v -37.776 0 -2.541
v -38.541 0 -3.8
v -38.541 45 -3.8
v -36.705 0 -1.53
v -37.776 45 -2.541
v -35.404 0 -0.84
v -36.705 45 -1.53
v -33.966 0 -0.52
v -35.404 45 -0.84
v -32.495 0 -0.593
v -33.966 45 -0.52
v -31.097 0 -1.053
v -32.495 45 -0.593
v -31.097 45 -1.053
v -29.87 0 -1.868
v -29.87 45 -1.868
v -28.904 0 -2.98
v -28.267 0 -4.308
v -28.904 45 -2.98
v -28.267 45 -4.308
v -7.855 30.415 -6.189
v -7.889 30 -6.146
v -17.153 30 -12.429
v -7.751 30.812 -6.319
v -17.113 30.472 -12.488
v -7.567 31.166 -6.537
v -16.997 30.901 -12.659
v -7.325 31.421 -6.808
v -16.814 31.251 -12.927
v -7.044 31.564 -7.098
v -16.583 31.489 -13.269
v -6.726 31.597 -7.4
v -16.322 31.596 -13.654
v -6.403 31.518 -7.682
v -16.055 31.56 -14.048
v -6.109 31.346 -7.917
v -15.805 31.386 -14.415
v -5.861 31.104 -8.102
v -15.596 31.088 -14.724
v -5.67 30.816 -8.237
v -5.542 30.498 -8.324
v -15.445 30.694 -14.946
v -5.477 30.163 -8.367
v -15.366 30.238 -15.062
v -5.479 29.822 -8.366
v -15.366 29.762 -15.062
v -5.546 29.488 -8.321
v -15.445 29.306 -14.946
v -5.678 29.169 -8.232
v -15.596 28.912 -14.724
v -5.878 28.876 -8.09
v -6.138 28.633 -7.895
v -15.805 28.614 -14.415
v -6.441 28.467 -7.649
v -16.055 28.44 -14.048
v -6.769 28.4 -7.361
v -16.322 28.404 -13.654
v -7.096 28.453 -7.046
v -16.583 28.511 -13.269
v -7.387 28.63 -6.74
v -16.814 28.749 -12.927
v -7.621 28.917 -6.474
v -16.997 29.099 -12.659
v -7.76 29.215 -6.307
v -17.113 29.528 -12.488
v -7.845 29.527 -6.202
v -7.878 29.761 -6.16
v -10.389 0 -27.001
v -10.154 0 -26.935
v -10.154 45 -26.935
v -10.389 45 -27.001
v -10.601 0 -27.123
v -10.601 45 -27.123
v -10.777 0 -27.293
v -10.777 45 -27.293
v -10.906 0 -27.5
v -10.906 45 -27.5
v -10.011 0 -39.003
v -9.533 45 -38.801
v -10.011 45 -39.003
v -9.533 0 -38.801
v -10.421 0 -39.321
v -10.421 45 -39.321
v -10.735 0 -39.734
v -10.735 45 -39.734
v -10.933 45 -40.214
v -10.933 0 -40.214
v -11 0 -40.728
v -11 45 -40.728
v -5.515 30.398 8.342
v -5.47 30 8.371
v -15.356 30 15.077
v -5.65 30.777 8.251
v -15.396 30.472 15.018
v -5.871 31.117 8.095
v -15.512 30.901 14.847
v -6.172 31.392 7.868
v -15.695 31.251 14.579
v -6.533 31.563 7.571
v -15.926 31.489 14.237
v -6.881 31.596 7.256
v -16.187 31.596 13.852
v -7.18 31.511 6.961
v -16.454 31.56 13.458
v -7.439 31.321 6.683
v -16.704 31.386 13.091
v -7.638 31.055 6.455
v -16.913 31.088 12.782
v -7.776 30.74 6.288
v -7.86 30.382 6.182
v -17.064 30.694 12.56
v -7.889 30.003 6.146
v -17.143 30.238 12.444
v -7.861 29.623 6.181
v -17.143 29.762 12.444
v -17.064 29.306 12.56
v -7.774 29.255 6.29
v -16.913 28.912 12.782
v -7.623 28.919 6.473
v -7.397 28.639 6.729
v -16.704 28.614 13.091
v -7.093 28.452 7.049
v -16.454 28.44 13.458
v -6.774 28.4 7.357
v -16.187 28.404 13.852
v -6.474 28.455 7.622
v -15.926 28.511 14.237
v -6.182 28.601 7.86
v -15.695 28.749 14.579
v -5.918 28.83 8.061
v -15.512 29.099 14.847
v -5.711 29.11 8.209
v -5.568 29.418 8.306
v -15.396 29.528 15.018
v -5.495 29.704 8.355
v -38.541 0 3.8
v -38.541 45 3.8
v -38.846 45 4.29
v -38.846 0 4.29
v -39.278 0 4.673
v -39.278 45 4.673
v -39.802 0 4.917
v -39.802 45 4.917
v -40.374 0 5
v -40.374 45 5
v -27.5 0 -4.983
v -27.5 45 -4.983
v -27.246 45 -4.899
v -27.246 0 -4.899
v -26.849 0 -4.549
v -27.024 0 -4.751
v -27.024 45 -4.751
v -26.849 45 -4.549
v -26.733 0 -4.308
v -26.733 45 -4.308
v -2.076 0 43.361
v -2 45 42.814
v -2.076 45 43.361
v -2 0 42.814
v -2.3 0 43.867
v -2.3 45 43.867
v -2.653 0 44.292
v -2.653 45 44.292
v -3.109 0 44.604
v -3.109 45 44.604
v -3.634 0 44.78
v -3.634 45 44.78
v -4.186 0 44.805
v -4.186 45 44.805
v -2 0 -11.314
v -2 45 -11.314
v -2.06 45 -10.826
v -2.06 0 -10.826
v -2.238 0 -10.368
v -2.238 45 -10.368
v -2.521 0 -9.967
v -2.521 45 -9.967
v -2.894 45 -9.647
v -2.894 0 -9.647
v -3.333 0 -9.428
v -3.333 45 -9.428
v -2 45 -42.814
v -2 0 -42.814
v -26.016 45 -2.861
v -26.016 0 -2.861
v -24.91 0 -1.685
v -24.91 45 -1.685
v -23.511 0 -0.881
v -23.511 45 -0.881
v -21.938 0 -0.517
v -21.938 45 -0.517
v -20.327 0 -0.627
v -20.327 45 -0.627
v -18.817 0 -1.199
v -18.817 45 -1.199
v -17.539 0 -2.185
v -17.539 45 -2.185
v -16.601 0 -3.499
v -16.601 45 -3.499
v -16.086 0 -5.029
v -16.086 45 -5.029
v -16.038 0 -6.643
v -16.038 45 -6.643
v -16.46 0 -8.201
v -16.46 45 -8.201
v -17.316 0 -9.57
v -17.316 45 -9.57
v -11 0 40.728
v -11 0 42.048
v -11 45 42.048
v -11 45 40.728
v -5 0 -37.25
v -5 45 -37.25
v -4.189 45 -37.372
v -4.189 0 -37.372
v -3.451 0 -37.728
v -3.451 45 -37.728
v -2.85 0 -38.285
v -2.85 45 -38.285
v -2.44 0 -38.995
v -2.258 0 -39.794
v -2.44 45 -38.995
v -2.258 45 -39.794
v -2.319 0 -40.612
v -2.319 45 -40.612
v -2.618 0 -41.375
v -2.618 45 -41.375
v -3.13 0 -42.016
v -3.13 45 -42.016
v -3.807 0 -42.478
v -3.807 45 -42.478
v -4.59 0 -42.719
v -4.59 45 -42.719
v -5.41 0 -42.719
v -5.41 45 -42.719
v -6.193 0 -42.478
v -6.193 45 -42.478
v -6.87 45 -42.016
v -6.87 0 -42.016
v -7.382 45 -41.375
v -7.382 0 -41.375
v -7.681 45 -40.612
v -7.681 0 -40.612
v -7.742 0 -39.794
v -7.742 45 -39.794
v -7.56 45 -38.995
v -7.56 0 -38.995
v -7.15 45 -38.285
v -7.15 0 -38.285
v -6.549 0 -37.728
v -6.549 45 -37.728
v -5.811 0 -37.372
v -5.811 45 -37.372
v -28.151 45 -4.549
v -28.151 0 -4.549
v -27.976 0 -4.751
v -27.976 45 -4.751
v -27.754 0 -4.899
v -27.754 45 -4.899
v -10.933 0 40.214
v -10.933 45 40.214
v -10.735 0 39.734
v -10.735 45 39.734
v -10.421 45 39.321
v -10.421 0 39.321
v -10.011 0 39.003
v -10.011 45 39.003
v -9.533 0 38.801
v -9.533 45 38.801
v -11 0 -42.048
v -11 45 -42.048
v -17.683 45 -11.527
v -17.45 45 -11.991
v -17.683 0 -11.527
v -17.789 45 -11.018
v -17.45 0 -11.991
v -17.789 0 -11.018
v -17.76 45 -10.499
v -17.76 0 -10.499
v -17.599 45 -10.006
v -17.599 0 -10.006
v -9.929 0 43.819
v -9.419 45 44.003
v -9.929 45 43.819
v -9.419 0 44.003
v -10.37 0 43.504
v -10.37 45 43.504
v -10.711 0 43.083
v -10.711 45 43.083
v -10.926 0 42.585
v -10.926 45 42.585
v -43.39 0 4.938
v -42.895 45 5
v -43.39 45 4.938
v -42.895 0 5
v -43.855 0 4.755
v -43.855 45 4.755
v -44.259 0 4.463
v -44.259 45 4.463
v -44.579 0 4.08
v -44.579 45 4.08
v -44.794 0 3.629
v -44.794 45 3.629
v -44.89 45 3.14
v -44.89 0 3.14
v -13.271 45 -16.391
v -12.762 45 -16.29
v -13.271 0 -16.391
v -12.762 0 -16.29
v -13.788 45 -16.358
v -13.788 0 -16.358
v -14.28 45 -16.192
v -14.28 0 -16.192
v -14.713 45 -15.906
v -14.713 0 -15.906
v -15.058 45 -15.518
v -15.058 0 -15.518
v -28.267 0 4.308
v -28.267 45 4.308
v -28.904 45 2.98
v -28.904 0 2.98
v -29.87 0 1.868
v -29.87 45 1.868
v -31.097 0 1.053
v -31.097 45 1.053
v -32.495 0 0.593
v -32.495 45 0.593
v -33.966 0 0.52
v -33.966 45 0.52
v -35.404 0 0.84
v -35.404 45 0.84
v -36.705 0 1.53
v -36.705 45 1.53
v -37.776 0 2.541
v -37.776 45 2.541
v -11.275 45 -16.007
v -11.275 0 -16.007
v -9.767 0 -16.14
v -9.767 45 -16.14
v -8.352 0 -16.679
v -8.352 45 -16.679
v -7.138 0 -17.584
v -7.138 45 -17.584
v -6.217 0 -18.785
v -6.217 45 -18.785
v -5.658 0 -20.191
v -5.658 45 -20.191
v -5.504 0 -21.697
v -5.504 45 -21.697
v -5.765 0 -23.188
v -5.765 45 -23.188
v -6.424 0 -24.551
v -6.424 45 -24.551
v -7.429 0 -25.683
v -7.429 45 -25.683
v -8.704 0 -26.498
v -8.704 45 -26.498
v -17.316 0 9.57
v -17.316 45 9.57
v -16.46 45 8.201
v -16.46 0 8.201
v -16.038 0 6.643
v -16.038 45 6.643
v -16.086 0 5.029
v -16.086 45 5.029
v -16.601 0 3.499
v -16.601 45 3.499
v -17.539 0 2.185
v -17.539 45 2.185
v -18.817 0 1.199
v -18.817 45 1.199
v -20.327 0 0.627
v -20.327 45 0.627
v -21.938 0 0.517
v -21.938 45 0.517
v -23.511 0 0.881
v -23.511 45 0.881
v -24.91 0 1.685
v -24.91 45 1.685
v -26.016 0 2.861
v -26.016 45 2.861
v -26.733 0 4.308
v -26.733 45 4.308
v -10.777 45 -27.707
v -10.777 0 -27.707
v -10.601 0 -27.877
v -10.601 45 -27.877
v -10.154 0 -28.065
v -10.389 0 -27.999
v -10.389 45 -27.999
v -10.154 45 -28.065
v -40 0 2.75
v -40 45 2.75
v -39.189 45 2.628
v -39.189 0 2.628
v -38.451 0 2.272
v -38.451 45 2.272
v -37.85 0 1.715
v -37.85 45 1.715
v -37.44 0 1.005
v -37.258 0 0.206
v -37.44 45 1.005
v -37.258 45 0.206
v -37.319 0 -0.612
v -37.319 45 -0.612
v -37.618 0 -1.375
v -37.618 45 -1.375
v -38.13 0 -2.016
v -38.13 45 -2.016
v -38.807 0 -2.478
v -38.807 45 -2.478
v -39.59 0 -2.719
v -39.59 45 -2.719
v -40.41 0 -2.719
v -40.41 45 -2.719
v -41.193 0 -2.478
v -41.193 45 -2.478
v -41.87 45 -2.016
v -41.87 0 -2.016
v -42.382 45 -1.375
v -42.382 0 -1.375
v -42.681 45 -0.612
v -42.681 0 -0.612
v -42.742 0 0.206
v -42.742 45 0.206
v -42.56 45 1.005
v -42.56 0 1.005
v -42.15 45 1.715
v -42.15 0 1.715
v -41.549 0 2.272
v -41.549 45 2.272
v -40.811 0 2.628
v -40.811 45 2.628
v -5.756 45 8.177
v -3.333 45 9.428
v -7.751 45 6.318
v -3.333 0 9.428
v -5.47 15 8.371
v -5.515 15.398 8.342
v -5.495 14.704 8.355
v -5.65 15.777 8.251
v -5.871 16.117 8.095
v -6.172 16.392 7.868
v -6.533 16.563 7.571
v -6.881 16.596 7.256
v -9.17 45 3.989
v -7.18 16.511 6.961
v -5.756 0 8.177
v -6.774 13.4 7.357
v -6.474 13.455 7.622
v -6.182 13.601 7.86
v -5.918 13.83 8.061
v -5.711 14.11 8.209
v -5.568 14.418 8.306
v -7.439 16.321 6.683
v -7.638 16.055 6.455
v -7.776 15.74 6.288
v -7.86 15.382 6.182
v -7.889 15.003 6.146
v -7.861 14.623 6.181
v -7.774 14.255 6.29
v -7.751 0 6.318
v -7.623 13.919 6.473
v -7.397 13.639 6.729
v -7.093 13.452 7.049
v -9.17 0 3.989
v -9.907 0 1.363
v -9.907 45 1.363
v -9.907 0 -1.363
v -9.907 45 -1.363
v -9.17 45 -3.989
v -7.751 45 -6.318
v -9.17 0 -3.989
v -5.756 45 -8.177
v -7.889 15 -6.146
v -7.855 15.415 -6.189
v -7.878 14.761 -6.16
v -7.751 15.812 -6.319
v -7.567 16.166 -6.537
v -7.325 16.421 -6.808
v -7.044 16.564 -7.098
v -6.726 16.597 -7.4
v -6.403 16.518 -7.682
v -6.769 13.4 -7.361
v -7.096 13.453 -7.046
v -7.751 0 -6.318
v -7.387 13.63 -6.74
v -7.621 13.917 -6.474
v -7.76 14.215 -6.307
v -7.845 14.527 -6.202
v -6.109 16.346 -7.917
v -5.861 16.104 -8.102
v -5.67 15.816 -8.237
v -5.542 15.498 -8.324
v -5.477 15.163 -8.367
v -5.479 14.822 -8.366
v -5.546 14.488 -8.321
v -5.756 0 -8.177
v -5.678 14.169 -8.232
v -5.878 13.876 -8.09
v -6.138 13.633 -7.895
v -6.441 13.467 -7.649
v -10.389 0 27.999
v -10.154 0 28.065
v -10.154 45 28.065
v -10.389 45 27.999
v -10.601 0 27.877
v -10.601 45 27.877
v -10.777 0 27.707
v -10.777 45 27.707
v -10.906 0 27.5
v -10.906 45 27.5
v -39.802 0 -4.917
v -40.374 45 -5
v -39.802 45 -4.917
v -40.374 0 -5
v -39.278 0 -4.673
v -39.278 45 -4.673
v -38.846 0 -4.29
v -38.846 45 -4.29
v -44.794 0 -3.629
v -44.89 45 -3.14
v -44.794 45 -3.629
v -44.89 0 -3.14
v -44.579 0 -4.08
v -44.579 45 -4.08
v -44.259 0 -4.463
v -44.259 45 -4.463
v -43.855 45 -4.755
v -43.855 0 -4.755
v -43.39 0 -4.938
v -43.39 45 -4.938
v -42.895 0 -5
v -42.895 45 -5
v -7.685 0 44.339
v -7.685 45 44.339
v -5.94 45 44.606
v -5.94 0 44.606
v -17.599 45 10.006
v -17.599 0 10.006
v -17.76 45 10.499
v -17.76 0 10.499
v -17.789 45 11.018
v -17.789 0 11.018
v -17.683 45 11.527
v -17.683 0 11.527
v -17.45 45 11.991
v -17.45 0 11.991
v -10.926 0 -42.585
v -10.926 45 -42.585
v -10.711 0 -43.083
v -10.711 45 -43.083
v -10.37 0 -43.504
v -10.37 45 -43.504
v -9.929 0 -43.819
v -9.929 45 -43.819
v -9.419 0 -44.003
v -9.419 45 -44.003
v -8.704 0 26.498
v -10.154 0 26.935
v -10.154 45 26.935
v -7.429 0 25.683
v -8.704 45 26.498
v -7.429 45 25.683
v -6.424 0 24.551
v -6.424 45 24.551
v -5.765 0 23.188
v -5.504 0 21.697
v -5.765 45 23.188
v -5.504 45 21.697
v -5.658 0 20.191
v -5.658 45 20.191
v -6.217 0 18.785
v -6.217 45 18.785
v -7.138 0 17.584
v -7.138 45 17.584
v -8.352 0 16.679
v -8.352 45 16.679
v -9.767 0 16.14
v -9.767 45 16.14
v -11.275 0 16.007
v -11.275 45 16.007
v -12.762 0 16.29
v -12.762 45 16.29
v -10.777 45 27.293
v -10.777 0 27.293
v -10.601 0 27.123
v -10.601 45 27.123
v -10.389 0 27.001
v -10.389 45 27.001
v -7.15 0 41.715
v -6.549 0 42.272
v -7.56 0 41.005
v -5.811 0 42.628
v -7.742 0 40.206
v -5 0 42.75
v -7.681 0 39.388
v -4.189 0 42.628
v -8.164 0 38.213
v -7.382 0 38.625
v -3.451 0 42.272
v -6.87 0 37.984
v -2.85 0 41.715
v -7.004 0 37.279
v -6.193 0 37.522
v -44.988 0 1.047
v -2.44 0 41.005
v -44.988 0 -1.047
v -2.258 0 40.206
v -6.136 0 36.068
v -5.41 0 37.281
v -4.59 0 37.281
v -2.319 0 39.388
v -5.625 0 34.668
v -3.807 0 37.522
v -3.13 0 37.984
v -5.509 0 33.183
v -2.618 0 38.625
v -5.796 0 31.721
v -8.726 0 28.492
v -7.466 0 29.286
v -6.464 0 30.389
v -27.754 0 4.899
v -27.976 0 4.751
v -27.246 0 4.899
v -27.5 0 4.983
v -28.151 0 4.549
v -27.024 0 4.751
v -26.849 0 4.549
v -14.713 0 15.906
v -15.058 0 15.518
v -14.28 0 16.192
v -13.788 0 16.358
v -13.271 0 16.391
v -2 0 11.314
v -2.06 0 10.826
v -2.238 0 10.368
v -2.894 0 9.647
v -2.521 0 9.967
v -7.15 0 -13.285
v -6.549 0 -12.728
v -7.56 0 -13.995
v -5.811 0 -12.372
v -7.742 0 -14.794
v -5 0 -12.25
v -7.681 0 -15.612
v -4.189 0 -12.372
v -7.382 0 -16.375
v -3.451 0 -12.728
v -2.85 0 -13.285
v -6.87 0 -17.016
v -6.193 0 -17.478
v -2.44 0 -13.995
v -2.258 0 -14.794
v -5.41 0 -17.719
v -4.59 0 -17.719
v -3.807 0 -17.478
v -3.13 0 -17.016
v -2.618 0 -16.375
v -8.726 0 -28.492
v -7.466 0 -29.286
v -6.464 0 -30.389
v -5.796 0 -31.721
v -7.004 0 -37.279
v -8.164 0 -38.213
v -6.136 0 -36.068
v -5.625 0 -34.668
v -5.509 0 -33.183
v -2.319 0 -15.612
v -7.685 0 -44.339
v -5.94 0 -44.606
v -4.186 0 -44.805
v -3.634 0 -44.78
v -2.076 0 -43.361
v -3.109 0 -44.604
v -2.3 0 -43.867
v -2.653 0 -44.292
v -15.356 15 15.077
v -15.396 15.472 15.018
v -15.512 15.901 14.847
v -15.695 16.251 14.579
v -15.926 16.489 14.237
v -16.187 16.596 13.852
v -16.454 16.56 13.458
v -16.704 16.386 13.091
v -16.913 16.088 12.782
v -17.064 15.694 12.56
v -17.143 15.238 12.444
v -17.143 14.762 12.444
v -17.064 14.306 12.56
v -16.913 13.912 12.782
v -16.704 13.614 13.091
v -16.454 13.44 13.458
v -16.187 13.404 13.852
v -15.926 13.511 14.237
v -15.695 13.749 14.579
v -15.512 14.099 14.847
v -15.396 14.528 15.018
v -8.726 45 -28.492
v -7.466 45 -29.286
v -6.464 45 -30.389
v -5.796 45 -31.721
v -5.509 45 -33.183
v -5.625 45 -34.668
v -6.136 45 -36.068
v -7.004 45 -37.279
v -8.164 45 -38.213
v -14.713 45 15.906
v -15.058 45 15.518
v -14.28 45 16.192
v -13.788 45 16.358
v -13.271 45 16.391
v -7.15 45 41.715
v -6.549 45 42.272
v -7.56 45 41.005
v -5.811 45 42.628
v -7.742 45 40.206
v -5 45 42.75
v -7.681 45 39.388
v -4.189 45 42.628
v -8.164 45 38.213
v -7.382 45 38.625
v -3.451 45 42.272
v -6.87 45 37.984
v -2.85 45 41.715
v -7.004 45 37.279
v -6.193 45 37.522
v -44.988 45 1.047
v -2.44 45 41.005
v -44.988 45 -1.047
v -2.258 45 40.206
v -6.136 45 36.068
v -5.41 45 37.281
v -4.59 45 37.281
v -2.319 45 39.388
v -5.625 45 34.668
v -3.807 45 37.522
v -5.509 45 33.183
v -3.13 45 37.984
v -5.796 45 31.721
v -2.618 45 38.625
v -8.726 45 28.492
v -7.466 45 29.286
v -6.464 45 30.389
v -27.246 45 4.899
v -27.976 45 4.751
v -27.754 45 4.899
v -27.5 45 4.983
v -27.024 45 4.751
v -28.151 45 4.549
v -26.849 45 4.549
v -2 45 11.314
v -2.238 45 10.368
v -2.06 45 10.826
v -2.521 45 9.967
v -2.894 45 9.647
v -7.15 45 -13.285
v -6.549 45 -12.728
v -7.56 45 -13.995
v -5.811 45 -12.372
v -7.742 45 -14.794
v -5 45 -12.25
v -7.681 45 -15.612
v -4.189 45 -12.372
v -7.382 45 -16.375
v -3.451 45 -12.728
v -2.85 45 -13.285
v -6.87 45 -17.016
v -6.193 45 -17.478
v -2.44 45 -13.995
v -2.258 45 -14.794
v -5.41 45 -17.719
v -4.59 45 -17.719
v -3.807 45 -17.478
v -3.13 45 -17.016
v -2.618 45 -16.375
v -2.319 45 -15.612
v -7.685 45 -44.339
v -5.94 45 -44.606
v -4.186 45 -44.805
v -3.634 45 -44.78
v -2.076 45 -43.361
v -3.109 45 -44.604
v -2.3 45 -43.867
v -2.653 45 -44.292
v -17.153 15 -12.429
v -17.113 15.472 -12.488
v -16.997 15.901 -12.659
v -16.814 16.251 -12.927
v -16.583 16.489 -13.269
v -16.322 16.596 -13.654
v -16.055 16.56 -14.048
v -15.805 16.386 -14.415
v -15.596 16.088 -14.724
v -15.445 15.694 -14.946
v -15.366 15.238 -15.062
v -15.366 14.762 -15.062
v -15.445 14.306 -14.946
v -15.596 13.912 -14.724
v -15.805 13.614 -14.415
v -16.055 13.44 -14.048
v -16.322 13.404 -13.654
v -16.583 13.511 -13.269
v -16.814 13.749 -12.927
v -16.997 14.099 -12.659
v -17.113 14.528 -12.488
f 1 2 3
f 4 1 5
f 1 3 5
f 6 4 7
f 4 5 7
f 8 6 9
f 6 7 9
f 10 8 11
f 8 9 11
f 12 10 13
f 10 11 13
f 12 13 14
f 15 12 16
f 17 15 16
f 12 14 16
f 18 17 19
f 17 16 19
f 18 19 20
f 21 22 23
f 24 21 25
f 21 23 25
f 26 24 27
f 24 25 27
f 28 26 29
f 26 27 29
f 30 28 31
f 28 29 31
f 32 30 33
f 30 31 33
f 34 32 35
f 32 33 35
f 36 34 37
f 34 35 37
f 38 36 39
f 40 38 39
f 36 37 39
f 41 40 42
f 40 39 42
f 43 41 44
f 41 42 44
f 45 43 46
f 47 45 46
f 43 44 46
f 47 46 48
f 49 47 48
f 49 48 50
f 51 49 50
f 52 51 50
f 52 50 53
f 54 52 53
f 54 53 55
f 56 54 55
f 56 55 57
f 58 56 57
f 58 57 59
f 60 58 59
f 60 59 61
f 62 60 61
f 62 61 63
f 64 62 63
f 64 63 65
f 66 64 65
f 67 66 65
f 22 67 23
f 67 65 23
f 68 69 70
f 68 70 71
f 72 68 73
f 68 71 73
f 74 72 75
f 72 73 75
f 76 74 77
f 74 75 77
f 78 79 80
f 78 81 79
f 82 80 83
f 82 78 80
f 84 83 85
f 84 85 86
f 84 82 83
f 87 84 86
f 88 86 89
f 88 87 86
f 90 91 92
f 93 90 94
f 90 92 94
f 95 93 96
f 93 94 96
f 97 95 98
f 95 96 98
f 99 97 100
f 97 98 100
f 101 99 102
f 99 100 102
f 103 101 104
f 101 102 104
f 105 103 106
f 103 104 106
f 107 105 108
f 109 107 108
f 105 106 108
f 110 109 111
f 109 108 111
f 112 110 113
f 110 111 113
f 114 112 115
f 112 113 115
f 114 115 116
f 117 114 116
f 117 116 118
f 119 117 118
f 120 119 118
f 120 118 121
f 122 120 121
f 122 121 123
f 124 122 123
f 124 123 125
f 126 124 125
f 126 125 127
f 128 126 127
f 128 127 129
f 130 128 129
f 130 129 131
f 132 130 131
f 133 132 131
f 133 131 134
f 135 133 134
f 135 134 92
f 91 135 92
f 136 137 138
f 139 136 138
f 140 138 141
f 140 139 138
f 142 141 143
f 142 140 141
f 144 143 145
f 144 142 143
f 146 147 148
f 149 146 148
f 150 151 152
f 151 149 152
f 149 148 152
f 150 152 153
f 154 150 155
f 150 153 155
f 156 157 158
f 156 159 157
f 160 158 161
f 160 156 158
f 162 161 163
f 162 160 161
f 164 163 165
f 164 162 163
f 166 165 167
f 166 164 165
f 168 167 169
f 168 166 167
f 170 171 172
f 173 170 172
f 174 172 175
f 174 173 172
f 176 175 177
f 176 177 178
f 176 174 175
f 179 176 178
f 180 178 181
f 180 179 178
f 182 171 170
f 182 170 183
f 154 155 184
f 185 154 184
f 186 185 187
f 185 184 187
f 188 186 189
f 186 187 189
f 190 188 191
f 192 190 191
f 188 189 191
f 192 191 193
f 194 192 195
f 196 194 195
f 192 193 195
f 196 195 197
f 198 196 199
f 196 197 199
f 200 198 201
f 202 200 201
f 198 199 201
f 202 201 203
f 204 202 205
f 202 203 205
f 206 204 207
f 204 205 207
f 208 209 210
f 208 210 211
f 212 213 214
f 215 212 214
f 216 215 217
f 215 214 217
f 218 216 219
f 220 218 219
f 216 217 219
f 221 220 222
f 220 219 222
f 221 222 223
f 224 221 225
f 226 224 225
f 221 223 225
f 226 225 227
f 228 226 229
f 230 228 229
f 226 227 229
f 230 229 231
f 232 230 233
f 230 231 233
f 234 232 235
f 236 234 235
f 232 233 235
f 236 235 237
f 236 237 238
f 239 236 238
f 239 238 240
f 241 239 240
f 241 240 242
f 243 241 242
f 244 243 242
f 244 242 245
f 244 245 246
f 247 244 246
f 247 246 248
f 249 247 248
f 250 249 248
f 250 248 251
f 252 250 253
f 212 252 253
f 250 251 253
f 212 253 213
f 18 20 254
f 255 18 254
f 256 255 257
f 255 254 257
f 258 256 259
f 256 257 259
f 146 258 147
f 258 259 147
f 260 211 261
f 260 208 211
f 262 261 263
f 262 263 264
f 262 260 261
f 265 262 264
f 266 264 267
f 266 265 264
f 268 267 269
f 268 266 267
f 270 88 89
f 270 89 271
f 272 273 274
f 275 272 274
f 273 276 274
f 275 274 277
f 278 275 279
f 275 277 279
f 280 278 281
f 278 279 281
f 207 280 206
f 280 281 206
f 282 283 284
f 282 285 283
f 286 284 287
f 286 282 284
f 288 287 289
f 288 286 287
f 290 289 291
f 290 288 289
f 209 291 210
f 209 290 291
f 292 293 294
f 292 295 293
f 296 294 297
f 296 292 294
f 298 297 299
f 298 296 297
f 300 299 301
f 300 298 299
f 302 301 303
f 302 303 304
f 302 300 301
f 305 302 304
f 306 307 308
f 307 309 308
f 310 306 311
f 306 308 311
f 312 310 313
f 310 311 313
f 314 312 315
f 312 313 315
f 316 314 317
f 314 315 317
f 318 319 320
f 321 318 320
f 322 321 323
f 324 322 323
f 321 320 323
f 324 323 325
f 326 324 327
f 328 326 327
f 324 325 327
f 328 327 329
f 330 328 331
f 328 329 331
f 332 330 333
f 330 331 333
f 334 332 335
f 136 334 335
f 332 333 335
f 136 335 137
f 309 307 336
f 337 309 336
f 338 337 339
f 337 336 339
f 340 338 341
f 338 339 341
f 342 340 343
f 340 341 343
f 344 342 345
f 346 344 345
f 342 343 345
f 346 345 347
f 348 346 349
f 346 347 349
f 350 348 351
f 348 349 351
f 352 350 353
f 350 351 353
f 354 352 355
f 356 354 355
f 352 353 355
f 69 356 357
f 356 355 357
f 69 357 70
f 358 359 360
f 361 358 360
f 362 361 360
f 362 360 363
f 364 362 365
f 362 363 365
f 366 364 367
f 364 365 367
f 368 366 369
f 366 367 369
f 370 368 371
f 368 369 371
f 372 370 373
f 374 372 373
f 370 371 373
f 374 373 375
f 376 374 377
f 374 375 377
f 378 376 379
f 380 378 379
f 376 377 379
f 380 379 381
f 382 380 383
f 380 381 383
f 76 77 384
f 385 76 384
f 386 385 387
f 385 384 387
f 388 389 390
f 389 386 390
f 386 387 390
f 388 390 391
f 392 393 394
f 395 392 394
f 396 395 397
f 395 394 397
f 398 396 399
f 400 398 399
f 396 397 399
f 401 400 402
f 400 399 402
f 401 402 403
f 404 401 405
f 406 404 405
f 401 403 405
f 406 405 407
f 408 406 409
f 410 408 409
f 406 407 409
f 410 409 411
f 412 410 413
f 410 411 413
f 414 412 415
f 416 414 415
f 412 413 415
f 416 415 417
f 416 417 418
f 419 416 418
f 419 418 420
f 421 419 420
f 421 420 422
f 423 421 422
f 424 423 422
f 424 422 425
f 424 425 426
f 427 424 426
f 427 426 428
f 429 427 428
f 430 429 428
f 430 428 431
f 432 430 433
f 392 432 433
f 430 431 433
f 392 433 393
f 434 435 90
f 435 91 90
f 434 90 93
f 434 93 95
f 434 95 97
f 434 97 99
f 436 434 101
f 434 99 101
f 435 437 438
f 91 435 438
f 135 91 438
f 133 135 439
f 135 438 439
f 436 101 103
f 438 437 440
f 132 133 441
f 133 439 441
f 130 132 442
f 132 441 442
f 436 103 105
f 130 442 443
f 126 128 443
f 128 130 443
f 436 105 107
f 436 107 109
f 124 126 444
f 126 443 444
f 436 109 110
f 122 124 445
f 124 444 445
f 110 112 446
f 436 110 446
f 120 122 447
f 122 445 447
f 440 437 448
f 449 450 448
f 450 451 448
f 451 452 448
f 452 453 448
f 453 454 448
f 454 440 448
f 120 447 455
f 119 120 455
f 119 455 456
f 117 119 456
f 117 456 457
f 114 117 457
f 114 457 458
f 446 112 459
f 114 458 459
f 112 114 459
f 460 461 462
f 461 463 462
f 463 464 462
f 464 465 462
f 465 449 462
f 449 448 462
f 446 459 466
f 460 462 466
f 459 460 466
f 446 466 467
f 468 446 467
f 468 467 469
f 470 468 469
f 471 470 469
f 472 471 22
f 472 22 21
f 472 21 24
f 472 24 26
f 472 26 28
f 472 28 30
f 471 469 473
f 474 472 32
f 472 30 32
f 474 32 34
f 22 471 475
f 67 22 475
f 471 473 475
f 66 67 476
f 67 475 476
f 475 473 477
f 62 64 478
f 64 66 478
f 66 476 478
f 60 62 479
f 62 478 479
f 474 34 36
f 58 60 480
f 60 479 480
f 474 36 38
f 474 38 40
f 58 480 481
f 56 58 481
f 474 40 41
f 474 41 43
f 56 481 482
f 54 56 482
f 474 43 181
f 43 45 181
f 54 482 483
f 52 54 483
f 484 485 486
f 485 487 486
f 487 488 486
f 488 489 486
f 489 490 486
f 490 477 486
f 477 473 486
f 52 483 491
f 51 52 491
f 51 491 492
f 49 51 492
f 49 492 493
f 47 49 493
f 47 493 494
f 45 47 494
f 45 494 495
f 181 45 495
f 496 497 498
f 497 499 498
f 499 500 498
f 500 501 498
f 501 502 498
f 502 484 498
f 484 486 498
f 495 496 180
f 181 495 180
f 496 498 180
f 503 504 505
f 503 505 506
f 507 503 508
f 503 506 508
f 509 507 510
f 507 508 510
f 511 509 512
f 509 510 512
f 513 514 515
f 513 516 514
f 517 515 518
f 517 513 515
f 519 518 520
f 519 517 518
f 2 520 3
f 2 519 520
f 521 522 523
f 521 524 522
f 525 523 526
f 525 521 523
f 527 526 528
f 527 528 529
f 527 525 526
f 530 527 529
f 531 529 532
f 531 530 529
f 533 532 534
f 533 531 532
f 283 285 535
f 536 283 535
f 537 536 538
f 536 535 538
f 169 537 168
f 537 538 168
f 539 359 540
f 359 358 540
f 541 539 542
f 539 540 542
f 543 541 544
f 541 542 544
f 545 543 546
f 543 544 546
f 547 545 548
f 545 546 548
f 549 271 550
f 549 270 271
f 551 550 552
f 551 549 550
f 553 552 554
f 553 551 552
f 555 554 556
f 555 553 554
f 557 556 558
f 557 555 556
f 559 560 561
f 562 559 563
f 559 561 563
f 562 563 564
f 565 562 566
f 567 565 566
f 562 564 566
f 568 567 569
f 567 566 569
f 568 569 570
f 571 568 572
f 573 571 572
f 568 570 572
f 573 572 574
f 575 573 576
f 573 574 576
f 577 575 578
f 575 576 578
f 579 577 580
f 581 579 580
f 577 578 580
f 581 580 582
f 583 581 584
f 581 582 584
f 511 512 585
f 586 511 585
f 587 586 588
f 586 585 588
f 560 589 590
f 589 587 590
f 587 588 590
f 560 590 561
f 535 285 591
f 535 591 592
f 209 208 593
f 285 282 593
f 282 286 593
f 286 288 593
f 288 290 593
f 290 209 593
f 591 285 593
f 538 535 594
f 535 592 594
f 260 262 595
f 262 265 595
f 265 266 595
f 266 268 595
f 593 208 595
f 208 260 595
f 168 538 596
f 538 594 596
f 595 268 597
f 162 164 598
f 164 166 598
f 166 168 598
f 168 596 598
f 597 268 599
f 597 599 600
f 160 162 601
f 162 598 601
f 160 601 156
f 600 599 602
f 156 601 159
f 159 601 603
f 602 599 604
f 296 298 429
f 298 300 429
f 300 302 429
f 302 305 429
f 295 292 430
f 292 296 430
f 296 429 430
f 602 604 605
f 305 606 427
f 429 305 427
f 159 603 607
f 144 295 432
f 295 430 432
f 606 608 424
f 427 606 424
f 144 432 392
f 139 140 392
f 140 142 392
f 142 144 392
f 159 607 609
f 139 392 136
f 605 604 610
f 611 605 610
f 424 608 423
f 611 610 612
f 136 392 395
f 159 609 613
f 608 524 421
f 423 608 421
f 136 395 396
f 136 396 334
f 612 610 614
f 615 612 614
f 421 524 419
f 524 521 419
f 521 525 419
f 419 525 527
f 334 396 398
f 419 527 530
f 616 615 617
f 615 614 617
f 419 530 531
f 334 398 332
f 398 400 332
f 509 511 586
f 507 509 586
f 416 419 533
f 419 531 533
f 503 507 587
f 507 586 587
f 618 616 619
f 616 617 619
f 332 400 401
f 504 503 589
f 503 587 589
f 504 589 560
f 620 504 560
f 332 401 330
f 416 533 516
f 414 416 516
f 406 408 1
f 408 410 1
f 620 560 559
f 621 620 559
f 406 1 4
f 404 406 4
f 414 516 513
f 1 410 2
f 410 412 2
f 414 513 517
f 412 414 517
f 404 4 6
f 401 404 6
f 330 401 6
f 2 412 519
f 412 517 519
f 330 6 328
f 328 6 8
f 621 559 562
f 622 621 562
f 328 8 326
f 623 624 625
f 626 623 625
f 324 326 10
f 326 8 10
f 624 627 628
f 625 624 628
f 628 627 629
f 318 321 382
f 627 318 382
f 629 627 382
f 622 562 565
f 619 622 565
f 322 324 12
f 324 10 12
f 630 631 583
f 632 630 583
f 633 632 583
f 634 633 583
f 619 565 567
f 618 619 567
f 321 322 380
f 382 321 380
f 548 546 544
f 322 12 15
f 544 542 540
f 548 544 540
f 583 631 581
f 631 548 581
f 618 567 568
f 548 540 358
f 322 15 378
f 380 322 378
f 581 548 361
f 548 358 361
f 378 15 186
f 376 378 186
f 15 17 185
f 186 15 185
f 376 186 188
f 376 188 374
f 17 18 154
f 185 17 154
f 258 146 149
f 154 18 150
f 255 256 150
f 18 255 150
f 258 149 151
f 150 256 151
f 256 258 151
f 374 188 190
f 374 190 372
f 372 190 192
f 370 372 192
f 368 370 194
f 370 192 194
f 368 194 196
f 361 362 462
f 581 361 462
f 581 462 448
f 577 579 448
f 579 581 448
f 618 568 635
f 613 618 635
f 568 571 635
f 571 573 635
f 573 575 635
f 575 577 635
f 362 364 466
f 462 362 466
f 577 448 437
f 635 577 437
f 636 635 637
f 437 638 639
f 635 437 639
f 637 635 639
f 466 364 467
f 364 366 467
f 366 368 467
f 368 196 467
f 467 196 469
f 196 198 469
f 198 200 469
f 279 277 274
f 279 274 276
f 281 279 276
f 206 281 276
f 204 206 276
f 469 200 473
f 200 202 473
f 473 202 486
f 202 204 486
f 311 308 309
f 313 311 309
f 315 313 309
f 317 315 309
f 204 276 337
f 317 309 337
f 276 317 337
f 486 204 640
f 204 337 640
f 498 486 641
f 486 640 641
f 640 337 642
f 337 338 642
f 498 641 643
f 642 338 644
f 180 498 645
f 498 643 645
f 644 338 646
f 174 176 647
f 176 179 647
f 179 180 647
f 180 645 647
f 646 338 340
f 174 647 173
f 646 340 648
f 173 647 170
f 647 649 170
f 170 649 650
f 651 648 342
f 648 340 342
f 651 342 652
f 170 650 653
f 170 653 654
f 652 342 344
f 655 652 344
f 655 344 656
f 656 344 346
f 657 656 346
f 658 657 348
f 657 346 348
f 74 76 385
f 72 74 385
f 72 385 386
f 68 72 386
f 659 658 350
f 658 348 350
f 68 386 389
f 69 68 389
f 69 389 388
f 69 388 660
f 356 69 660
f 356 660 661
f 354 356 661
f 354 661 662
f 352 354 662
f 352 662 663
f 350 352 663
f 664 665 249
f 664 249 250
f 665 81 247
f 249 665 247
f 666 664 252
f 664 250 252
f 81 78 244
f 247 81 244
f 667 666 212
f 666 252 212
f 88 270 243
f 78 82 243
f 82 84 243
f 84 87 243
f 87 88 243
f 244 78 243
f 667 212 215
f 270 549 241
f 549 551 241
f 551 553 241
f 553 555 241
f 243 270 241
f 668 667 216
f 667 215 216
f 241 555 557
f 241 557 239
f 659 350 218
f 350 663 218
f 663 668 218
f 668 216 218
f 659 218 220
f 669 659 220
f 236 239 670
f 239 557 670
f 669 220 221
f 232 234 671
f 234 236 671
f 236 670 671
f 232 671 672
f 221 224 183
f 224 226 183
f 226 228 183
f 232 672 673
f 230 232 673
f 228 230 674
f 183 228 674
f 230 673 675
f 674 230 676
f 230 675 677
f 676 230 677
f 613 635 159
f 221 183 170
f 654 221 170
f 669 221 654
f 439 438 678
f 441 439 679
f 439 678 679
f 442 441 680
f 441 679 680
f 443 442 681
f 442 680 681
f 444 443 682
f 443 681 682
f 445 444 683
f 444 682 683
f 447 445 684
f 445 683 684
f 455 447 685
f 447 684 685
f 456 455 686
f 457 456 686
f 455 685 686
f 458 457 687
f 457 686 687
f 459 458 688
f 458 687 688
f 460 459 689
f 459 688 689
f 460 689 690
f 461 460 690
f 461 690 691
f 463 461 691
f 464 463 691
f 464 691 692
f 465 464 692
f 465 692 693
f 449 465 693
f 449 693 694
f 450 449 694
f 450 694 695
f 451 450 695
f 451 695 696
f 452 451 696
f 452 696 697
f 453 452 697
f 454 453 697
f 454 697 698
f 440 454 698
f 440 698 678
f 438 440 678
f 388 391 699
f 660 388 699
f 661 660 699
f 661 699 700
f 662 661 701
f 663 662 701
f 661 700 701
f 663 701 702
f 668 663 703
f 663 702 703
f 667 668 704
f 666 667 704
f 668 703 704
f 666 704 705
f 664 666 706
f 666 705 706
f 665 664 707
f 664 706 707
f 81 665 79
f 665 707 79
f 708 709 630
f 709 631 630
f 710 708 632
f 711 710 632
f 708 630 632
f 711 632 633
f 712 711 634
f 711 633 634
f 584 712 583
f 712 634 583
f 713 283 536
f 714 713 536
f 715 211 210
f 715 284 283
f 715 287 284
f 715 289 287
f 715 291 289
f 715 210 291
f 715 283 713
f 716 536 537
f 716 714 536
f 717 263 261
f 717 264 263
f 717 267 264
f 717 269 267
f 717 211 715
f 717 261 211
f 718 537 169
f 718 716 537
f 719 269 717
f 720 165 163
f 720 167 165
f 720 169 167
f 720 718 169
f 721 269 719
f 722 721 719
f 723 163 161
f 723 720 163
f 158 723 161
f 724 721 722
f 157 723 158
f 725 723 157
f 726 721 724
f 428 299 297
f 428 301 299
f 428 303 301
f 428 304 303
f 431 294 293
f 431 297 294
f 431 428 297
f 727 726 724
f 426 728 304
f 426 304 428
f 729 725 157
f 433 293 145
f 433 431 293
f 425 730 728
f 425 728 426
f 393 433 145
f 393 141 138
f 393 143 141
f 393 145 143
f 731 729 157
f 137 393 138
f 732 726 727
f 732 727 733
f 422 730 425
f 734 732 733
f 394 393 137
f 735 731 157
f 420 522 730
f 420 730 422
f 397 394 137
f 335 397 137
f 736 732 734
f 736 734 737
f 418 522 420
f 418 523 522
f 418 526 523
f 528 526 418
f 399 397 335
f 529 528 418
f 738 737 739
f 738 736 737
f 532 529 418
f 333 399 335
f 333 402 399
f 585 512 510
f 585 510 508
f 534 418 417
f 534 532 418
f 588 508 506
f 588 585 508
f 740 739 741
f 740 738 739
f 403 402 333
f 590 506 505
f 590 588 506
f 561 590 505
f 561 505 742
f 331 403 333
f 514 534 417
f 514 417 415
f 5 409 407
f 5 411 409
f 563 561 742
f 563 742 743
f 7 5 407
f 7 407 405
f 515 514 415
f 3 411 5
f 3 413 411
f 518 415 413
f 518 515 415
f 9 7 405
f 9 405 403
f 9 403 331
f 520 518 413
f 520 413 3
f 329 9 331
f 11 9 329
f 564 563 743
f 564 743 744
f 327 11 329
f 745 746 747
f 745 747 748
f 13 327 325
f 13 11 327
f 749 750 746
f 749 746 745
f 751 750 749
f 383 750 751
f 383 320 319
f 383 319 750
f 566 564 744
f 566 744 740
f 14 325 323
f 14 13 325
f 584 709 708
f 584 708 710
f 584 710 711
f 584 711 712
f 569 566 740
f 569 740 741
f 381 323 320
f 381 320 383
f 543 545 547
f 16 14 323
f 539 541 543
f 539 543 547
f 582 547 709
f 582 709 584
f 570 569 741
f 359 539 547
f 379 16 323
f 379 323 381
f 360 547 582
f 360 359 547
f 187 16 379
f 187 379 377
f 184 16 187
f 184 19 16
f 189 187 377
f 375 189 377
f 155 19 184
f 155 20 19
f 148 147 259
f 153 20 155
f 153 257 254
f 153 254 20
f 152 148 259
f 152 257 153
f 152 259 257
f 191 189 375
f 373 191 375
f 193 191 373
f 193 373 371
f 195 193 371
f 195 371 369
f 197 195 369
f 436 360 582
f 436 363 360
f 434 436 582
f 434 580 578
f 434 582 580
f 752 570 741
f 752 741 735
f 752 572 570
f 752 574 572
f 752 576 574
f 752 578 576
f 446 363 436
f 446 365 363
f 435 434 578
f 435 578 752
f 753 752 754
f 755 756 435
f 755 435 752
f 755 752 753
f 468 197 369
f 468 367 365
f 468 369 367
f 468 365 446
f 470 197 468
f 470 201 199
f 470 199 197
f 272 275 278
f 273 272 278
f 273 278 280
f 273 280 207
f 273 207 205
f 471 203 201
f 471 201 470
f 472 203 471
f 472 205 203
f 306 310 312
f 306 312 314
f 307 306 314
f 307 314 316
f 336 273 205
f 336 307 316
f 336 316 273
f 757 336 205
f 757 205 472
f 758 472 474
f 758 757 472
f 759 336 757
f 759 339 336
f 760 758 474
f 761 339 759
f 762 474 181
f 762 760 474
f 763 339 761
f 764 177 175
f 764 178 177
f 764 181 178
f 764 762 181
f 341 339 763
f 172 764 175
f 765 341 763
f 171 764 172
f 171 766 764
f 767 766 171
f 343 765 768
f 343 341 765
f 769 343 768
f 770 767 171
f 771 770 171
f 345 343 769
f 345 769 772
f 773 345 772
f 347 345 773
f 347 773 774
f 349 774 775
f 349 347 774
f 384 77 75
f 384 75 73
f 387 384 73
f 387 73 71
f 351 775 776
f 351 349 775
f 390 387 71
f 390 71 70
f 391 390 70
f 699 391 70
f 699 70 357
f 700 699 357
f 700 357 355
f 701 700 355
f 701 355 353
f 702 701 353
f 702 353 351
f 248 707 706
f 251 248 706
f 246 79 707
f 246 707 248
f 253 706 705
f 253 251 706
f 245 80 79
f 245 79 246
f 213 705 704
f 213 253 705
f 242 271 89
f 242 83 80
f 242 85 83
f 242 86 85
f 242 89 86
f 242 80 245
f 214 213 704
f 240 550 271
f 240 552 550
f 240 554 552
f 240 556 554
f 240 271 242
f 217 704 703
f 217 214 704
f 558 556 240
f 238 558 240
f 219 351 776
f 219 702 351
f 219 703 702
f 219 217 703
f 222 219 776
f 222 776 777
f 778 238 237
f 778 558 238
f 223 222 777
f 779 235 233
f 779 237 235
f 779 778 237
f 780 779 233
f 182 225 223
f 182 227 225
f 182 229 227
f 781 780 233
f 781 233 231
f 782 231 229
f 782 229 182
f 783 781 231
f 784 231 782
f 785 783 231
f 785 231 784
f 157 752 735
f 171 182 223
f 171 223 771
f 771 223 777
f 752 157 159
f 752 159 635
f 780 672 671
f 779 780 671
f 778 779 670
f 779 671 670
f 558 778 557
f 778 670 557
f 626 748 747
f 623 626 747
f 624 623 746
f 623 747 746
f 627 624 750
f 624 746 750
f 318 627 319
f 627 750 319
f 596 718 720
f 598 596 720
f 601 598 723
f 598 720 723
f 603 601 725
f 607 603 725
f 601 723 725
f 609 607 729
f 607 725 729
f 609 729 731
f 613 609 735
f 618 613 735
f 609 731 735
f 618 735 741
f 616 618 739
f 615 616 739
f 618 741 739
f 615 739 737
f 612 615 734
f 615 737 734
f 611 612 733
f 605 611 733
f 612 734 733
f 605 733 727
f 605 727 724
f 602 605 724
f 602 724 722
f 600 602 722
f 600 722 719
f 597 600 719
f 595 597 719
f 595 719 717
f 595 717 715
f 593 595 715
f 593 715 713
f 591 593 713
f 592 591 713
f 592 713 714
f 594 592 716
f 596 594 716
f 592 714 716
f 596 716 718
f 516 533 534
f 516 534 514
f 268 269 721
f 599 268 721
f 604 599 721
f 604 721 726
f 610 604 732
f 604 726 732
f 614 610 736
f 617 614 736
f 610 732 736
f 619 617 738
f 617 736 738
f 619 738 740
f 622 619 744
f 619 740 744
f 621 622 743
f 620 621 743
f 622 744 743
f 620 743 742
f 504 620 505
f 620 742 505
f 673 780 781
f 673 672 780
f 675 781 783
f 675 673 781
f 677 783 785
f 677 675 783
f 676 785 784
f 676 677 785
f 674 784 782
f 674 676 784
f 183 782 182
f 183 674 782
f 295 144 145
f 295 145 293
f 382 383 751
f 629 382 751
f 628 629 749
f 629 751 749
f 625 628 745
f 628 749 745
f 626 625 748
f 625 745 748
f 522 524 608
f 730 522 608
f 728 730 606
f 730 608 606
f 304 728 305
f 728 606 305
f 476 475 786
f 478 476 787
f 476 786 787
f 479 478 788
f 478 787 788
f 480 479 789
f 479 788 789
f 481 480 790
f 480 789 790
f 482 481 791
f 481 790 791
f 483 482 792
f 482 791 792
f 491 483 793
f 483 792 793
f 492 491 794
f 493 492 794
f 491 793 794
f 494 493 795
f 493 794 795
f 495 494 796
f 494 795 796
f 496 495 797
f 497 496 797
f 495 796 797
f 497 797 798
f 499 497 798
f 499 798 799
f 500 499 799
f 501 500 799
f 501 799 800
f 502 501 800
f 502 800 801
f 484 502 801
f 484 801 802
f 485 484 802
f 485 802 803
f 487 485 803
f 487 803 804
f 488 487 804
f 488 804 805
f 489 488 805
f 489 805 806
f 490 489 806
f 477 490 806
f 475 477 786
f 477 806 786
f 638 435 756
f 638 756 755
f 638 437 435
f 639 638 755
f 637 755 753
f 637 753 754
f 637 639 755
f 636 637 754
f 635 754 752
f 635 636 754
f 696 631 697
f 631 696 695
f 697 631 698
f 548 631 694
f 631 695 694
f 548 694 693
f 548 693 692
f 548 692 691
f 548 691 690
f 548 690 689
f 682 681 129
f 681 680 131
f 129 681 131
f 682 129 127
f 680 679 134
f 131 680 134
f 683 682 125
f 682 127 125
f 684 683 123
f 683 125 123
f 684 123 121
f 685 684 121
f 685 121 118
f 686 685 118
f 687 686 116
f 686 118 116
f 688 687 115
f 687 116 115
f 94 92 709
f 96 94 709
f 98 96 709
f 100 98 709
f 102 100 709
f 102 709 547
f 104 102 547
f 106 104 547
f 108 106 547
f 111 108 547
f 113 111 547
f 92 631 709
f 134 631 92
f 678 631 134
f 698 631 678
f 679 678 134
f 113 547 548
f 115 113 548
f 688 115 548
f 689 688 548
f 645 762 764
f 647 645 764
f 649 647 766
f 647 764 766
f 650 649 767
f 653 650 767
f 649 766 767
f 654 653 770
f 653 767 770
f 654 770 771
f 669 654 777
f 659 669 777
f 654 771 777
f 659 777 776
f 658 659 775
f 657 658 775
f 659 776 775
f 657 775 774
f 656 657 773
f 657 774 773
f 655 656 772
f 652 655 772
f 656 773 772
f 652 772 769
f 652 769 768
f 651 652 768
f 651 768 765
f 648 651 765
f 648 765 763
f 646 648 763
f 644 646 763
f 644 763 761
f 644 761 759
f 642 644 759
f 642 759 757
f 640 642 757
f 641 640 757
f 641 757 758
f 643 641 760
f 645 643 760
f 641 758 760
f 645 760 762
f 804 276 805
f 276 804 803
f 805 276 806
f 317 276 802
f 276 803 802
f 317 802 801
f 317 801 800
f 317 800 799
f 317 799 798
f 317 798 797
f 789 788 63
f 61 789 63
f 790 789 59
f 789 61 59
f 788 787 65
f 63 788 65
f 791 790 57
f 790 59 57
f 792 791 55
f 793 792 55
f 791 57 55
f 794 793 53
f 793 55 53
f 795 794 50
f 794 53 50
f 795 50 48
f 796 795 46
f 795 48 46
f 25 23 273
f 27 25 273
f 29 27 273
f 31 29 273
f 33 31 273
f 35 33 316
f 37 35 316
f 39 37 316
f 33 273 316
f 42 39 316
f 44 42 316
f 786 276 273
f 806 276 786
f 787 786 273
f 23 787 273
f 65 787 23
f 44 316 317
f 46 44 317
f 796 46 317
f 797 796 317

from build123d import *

# Parameters (mm, degrees)
BOSS_EXTRUDE1_DEPTH = 45
SKETCH2_R           = 2.75
CUT_EXTRUDE1_DEPTH  = 45
SKETCH3_R           = 5.5
CUT_EXTRUDE2_DEPTH  = 45
CUT_EXTRUDE3_DEPTH  = 45
SKETCH5_R           = 1.6
CUT_EXTRUDE5_DEPTH  = 15
SKETCH6_R           = 1.6
CUT_EXTRUDE6_DEPTH  = 15
FILLET1_R           = 2
FILLET2_R           = 1
FILLET3_R           = 2
FILLET4_R           = 1
SKETCH7_W           = 1
SKETCH7_H           = 92.409175645
CUT_EXTRUDE7_DEPTH  = 45
FILLET8_R           = 2


with BuildPart() as part:
    # Sketch1 → Boss-Extrude1 (new body)
    with BuildSketch(Plane(origin=(0, 0, 0), x_dir=(1, 0, 0), z_dir=(0, 1, 0))):
        with BuildLine():
            Line((-1, 9.949874371), (-1, 44.988887517))
            ThreePointArc((-1, 44.988887517), (-45, 0), (-1, -44.988887517))
            Line((-1, -44.988887517), (-1, -9.949874371))
            ThreePointArc((-1, -9.949874371), (-10, 0), (-1, 9.949874371))
        make_face()
    extrude(amount=BOSS_EXTRUDE1_DEPTH)

    # Sketch2 → Cut-Extrude1 (cut)
    with BuildSketch(Plane(origin=(0, 45, 0), x_dir=(1, 0, 0), z_dir=(0, 1, 0))):
        with Locations(Location((-40, 0, 0), (0, 0, 270))):
            Circle(SKETCH2_R)
        with Locations(Location((-5, 15, 0), (0, 0, 270))):
            Circle(SKETCH2_R)
        with Locations(Location((-5, 40, 0), (0, 0, 270))):
            Circle(SKETCH2_R)
        with Locations(Location((-5, -40, 0), (0, 0, 270))):
            Circle(SKETCH2_R)
    extrude(amount=-CUT_EXTRUDE1_DEPTH, mode=Mode.SUBTRACT)

    # Sketch3 → Cut-Extrude2 (cut)
    with BuildSketch(Plane(origin=(0, 45, 0), x_dir=(1, 0, 0), z_dir=(0, 1, 0))):
        with Locations(Location((-33.5, 6, 0), (0, 0, 270))):
            Circle(SKETCH3_R)
        with Locations(Location((-21.5, 6, 0), (0, 0, 270))):
            Circle(SKETCH3_R)
        with Locations(Location((-11, 21.5, 0), (0, 0, 270))):
            Circle(SKETCH3_R)
        with Locations(Location((-11, 33.5, 0), (0, 0, 270))):
            Circle(SKETCH3_R)
        with Locations(Location((-33.5, -6, 0), (0, 0, 270))):
            Circle(SKETCH3_R)
        with Locations(Location((-21.5, -6, 0), (0, 0, 270))):
            Circle(SKETCH3_R)
        with Locations(Location((-11, -33.5, 0), (0, 0, 270))):
            Circle(SKETCH3_R)
        with Locations(Location((-11, -21.5, 0), (0, 0, 270))):
            Circle(SKETCH3_R)
    extrude(amount=-CUT_EXTRUDE2_DEPTH, mode=Mode.SUBTRACT)

    # Sketch4 → Cut-Extrude3 (cut)
    with BuildSketch(Plane(origin=(0, 45, 0), x_dir=(1, 0, 0), z_dir=(0, 1, 0))):
        with BuildLine():
            ThreePointArc((-11, 43.634848459), (-33.902512538, 29.590870951), (-44.72135955, 5))
            Line((-44.72135955, 5), (-38.908326913, 5))
            ThreePointArc((-38.908326913, 5), (-34.002096593, 11.477033779), (-28, 6))
            ThreePointArc((-28, 6), (-28.022966221, 5.497903407), (-28.091673087, 5))
            Line((-28.091673087, 5), (-27.5, 5))
            Line((-27.5, 5), (-26.908326913, 5))
            ThreePointArc((-26.908326913, 5), (-24.51323898, 10.601129302), (-18.421669276, 10.557837201))
            Line((-18.421669276, 10.557837201), (-14.087297918, 16.948232039))
            ThreePointArc((-14.087297918, 16.948232039), (-16.257600393, 23.11481829), (-11, 27))
            Line((-11, 27), (-11, 28))
            ThreePointArc((-11, 28), (-16.5, 33.5), (-11, 39))
            Line((-11, 39), (-11, 43.634848459))
        make_face()
        with BuildLine():
            Line((-38.908326913, -5), (-44.72135955, -5))
            ThreePointArc((-44.72135955, -5), (-33.902512538, -29.590870951), (-11, -43.634848459))
            Line((-11, -43.634848459), (-11, -39))
            ThreePointArc((-11, -39), (-16.5, -33.5), (-11, -28))
            Line((-11, -28), (-11, -27))
            ThreePointArc((-11, -27), (-16.257600393, -23.11481829), (-14.087297918, -16.948232039))
            Line((-14.087297918, -16.948232039), (-18.421669276, -10.557837201))
            ThreePointArc((-18.421669276, -10.557837201), (-24.51323898, -10.601129302), (-26.908326913, -5))
            Line((-26.908326913, -5), (-27.5, -5))
            Line((-27.5, -5), (-28.091673087, -5))
            ThreePointArc((-28.091673087, -5), (-28.022966221, -5.497903407), (-28, -6))
            ThreePointArc((-28, -6), (-34.002096593, -11.477033779), (-38.908326913, -5))
        make_face()
    extrude(amount=-CUT_EXTRUDE3_DEPTH, mode=Mode.SUBTRACT)

    # Sketch5 → Cut-Extrude5 (cut)
    with BuildSketch(Plane(origin=(-17.521876952, 0, -11.884449008), x_dir=(-0.5613268941159263, 0, 0.8275941746666465), z_dir=(-0.8275941746666464, 0, -0.5613268941159262))):
        with Locations((-2.257852543, 30)):
            Circle(SKETCH5_R)
        with Locations((-2.257852543, 15)):
            Circle(SKETCH5_R)
    extrude(amount=-CUT_EXTRUDE5_DEPTH, mode=Mode.SUBTRACT)

    # Sketch6 → Cut-Extrude6 (cut)
    with BuildSketch(Plane(origin=(-17.521876952, 0, 11.884449008), x_dir=(0.5613268941159263, 0, 0.8275941746666465), z_dir=(-0.8275941746666464, 0, 0.5613268941159262))):
        with Locations((2.257852543, 30)):
            Circle(SKETCH6_R)
        with Locations((2.257852543, 15)):
            Circle(SKETCH6_R)
    extrude(amount=-CUT_EXTRUDE6_DEPTH, mode=Mode.SUBTRACT)

    # Fillet1
    fillet1_edges = [part.edges().sort_by_distance(p)[0] for p in [
        (-18.421669276, 22.5, 10.557837201),
        (-14.087297918, 22.5, 16.948232039),
        (-14.087297918, 22.5, -16.948232039),
        (-18.421669276, 22.5, -10.557837201),
    ]]
    fillet(fillet1_edges, radius=FILLET1_R)

    # Fillet2
    # the kernel refuses this fillet: 1 mm, written as the material it takes off along each edge
    with BuildSketch(Plane(origin=(-11, 47.306540723, 28), x_dir=(0.9970192610334746, 0, 0.0771530500256742), z_dir=(0, -1, 0)), Plane(origin=(-11, 47.306540723, -27), x_dir=(0.9970192610334746, 0, 0.0771530500256742), z_dir=(0, -1, 0))) as fillet2_piece_1:
        with BuildLine():
            CenterArc((0.9258366, -0.997019261), FILLET2_R, 94.424941549, 81.150116902)
            Line((-0.071182661, -0.919866211), (0, 0))
            ThreePointArc((0, 0), (0.424341775, -0.016394064), (0.84868355, 0))
        make_face()
    extrude(amount=49.613081447, mode=Mode.SUBTRACT)
    with BuildSketch(Plane(origin=(-11, 47.306540723, 27), x_dir=(0, 0, 1), z_dir=(0, -1, 0)), Plane(origin=(-11, 47.306540723, -28), x_dir=(0, 0, 1), z_dir=(0, -1, 0))) as fillet2_piece_2:
        with BuildLine():
            CenterArc((0.922616289, -1), FILLET2_R, 90, 81.150116902)
            ThreePointArc((-0.065478524, -0.846153846), (-0.016394064, -0.424341775), (0, 0))
            Line((0, 0), (0.922616289, 0))
        make_face()
    extrude(amount=49.613081447, mode=Mode.SUBTRACT)

    # Fillet3
    fillet3_edges = [part.edges().sort_by_distance(p)[0] for p in [
        (-11, 22.5, 39),
        (-11, 22.5, 43.634848459),
        (-44.72135955, 22.5, 5),
        (-38.908326913, 22.5, 5),
        (-38.908326913, 22.5, -5),
        (-44.72135955, 22.5, -5),
        (-11, 22.5, -43.634848459),
        (-11, 22.5, -39),
    ]]
    fillet(fillet3_edges, radius=FILLET3_R)

    # Fillet4
    # the kernel refuses this fillet: 1 mm, written as the material it takes off along each edge
    with BuildSketch(Plane(origin=(-26.908326913, 46.940828813, 5), x_dir=(-1, 0, 0), z_dir=(0, -1, 0)), Plane(origin=(-28.091673087, 46.940828813, -5), x_dir=(1, 0, 0), z_dir=(0, -1, 0))) as fillet4_piece_1:
        with BuildLine():
            CenterArc((0.776331525, 1), FILLET4_R, 197.920213139, 72.079786861)
            ThreePointArc((-0.175154388, 0.692307692), (-0.076329158, 0.348999608), (0, 0))
            Line((0, 0), (0.776331525, 0))
        make_face()
    extrude(amount=48.881657626, mode=Mode.SUBTRACT)
    with BuildSketch(Plane(origin=(-28.091673087, 46.940828813, 5), x_dir=(-0.24527265600487286, 0, -0.9694541372423533), z_dir=(0, -1, 0)), Plane(origin=(-26.908326913, 46.940828813, -5), x_dir=(0.2452726560048734, 0, 0.9694541372423531), z_dir=(0, -1, 0))) as fillet4_piece_2:
        with BuildLine():
            CenterArc((0.779041242, 0.997890465), FILLET4_R, 194.197947418, 72.079786861)
            Line((-0.190412895, 0.752617809), (0, 0))
            ThreePointArc((0, 0), (0.357060569, 0.011602442), (0.714121139, 0))
        make_face()
    extrude(amount=48.881657626, mode=Mode.SUBTRACT)

    # Sketch7 → Cut-Extrude7 (cut)
    with BuildSketch(Plane(origin=(0, 45, 0), x_dir=(1, 0, 0), z_dir=(0, 1, 0))):
        with Locations((-1.5, -1.215700306)):
            Rectangle(SKETCH7_W, SKETCH7_H)
    extrude(amount=-CUT_EXTRUDE7_DEPTH, mode=Mode.SUBTRACT)

    # Fillet8
    fillet8_edges = [part.edges().sort_by_distance(p)[0] for p in [
        (-2, 22.5, -44.955533586),
        (-2, 22.5, 44.955533586),
        (-2, 22.5, -9.797958971),
        (-2, 22.5, 9.797958971),
    ]]
    fillet(fillet8_edges, radius=FILLET8_R)


solid = part.part
